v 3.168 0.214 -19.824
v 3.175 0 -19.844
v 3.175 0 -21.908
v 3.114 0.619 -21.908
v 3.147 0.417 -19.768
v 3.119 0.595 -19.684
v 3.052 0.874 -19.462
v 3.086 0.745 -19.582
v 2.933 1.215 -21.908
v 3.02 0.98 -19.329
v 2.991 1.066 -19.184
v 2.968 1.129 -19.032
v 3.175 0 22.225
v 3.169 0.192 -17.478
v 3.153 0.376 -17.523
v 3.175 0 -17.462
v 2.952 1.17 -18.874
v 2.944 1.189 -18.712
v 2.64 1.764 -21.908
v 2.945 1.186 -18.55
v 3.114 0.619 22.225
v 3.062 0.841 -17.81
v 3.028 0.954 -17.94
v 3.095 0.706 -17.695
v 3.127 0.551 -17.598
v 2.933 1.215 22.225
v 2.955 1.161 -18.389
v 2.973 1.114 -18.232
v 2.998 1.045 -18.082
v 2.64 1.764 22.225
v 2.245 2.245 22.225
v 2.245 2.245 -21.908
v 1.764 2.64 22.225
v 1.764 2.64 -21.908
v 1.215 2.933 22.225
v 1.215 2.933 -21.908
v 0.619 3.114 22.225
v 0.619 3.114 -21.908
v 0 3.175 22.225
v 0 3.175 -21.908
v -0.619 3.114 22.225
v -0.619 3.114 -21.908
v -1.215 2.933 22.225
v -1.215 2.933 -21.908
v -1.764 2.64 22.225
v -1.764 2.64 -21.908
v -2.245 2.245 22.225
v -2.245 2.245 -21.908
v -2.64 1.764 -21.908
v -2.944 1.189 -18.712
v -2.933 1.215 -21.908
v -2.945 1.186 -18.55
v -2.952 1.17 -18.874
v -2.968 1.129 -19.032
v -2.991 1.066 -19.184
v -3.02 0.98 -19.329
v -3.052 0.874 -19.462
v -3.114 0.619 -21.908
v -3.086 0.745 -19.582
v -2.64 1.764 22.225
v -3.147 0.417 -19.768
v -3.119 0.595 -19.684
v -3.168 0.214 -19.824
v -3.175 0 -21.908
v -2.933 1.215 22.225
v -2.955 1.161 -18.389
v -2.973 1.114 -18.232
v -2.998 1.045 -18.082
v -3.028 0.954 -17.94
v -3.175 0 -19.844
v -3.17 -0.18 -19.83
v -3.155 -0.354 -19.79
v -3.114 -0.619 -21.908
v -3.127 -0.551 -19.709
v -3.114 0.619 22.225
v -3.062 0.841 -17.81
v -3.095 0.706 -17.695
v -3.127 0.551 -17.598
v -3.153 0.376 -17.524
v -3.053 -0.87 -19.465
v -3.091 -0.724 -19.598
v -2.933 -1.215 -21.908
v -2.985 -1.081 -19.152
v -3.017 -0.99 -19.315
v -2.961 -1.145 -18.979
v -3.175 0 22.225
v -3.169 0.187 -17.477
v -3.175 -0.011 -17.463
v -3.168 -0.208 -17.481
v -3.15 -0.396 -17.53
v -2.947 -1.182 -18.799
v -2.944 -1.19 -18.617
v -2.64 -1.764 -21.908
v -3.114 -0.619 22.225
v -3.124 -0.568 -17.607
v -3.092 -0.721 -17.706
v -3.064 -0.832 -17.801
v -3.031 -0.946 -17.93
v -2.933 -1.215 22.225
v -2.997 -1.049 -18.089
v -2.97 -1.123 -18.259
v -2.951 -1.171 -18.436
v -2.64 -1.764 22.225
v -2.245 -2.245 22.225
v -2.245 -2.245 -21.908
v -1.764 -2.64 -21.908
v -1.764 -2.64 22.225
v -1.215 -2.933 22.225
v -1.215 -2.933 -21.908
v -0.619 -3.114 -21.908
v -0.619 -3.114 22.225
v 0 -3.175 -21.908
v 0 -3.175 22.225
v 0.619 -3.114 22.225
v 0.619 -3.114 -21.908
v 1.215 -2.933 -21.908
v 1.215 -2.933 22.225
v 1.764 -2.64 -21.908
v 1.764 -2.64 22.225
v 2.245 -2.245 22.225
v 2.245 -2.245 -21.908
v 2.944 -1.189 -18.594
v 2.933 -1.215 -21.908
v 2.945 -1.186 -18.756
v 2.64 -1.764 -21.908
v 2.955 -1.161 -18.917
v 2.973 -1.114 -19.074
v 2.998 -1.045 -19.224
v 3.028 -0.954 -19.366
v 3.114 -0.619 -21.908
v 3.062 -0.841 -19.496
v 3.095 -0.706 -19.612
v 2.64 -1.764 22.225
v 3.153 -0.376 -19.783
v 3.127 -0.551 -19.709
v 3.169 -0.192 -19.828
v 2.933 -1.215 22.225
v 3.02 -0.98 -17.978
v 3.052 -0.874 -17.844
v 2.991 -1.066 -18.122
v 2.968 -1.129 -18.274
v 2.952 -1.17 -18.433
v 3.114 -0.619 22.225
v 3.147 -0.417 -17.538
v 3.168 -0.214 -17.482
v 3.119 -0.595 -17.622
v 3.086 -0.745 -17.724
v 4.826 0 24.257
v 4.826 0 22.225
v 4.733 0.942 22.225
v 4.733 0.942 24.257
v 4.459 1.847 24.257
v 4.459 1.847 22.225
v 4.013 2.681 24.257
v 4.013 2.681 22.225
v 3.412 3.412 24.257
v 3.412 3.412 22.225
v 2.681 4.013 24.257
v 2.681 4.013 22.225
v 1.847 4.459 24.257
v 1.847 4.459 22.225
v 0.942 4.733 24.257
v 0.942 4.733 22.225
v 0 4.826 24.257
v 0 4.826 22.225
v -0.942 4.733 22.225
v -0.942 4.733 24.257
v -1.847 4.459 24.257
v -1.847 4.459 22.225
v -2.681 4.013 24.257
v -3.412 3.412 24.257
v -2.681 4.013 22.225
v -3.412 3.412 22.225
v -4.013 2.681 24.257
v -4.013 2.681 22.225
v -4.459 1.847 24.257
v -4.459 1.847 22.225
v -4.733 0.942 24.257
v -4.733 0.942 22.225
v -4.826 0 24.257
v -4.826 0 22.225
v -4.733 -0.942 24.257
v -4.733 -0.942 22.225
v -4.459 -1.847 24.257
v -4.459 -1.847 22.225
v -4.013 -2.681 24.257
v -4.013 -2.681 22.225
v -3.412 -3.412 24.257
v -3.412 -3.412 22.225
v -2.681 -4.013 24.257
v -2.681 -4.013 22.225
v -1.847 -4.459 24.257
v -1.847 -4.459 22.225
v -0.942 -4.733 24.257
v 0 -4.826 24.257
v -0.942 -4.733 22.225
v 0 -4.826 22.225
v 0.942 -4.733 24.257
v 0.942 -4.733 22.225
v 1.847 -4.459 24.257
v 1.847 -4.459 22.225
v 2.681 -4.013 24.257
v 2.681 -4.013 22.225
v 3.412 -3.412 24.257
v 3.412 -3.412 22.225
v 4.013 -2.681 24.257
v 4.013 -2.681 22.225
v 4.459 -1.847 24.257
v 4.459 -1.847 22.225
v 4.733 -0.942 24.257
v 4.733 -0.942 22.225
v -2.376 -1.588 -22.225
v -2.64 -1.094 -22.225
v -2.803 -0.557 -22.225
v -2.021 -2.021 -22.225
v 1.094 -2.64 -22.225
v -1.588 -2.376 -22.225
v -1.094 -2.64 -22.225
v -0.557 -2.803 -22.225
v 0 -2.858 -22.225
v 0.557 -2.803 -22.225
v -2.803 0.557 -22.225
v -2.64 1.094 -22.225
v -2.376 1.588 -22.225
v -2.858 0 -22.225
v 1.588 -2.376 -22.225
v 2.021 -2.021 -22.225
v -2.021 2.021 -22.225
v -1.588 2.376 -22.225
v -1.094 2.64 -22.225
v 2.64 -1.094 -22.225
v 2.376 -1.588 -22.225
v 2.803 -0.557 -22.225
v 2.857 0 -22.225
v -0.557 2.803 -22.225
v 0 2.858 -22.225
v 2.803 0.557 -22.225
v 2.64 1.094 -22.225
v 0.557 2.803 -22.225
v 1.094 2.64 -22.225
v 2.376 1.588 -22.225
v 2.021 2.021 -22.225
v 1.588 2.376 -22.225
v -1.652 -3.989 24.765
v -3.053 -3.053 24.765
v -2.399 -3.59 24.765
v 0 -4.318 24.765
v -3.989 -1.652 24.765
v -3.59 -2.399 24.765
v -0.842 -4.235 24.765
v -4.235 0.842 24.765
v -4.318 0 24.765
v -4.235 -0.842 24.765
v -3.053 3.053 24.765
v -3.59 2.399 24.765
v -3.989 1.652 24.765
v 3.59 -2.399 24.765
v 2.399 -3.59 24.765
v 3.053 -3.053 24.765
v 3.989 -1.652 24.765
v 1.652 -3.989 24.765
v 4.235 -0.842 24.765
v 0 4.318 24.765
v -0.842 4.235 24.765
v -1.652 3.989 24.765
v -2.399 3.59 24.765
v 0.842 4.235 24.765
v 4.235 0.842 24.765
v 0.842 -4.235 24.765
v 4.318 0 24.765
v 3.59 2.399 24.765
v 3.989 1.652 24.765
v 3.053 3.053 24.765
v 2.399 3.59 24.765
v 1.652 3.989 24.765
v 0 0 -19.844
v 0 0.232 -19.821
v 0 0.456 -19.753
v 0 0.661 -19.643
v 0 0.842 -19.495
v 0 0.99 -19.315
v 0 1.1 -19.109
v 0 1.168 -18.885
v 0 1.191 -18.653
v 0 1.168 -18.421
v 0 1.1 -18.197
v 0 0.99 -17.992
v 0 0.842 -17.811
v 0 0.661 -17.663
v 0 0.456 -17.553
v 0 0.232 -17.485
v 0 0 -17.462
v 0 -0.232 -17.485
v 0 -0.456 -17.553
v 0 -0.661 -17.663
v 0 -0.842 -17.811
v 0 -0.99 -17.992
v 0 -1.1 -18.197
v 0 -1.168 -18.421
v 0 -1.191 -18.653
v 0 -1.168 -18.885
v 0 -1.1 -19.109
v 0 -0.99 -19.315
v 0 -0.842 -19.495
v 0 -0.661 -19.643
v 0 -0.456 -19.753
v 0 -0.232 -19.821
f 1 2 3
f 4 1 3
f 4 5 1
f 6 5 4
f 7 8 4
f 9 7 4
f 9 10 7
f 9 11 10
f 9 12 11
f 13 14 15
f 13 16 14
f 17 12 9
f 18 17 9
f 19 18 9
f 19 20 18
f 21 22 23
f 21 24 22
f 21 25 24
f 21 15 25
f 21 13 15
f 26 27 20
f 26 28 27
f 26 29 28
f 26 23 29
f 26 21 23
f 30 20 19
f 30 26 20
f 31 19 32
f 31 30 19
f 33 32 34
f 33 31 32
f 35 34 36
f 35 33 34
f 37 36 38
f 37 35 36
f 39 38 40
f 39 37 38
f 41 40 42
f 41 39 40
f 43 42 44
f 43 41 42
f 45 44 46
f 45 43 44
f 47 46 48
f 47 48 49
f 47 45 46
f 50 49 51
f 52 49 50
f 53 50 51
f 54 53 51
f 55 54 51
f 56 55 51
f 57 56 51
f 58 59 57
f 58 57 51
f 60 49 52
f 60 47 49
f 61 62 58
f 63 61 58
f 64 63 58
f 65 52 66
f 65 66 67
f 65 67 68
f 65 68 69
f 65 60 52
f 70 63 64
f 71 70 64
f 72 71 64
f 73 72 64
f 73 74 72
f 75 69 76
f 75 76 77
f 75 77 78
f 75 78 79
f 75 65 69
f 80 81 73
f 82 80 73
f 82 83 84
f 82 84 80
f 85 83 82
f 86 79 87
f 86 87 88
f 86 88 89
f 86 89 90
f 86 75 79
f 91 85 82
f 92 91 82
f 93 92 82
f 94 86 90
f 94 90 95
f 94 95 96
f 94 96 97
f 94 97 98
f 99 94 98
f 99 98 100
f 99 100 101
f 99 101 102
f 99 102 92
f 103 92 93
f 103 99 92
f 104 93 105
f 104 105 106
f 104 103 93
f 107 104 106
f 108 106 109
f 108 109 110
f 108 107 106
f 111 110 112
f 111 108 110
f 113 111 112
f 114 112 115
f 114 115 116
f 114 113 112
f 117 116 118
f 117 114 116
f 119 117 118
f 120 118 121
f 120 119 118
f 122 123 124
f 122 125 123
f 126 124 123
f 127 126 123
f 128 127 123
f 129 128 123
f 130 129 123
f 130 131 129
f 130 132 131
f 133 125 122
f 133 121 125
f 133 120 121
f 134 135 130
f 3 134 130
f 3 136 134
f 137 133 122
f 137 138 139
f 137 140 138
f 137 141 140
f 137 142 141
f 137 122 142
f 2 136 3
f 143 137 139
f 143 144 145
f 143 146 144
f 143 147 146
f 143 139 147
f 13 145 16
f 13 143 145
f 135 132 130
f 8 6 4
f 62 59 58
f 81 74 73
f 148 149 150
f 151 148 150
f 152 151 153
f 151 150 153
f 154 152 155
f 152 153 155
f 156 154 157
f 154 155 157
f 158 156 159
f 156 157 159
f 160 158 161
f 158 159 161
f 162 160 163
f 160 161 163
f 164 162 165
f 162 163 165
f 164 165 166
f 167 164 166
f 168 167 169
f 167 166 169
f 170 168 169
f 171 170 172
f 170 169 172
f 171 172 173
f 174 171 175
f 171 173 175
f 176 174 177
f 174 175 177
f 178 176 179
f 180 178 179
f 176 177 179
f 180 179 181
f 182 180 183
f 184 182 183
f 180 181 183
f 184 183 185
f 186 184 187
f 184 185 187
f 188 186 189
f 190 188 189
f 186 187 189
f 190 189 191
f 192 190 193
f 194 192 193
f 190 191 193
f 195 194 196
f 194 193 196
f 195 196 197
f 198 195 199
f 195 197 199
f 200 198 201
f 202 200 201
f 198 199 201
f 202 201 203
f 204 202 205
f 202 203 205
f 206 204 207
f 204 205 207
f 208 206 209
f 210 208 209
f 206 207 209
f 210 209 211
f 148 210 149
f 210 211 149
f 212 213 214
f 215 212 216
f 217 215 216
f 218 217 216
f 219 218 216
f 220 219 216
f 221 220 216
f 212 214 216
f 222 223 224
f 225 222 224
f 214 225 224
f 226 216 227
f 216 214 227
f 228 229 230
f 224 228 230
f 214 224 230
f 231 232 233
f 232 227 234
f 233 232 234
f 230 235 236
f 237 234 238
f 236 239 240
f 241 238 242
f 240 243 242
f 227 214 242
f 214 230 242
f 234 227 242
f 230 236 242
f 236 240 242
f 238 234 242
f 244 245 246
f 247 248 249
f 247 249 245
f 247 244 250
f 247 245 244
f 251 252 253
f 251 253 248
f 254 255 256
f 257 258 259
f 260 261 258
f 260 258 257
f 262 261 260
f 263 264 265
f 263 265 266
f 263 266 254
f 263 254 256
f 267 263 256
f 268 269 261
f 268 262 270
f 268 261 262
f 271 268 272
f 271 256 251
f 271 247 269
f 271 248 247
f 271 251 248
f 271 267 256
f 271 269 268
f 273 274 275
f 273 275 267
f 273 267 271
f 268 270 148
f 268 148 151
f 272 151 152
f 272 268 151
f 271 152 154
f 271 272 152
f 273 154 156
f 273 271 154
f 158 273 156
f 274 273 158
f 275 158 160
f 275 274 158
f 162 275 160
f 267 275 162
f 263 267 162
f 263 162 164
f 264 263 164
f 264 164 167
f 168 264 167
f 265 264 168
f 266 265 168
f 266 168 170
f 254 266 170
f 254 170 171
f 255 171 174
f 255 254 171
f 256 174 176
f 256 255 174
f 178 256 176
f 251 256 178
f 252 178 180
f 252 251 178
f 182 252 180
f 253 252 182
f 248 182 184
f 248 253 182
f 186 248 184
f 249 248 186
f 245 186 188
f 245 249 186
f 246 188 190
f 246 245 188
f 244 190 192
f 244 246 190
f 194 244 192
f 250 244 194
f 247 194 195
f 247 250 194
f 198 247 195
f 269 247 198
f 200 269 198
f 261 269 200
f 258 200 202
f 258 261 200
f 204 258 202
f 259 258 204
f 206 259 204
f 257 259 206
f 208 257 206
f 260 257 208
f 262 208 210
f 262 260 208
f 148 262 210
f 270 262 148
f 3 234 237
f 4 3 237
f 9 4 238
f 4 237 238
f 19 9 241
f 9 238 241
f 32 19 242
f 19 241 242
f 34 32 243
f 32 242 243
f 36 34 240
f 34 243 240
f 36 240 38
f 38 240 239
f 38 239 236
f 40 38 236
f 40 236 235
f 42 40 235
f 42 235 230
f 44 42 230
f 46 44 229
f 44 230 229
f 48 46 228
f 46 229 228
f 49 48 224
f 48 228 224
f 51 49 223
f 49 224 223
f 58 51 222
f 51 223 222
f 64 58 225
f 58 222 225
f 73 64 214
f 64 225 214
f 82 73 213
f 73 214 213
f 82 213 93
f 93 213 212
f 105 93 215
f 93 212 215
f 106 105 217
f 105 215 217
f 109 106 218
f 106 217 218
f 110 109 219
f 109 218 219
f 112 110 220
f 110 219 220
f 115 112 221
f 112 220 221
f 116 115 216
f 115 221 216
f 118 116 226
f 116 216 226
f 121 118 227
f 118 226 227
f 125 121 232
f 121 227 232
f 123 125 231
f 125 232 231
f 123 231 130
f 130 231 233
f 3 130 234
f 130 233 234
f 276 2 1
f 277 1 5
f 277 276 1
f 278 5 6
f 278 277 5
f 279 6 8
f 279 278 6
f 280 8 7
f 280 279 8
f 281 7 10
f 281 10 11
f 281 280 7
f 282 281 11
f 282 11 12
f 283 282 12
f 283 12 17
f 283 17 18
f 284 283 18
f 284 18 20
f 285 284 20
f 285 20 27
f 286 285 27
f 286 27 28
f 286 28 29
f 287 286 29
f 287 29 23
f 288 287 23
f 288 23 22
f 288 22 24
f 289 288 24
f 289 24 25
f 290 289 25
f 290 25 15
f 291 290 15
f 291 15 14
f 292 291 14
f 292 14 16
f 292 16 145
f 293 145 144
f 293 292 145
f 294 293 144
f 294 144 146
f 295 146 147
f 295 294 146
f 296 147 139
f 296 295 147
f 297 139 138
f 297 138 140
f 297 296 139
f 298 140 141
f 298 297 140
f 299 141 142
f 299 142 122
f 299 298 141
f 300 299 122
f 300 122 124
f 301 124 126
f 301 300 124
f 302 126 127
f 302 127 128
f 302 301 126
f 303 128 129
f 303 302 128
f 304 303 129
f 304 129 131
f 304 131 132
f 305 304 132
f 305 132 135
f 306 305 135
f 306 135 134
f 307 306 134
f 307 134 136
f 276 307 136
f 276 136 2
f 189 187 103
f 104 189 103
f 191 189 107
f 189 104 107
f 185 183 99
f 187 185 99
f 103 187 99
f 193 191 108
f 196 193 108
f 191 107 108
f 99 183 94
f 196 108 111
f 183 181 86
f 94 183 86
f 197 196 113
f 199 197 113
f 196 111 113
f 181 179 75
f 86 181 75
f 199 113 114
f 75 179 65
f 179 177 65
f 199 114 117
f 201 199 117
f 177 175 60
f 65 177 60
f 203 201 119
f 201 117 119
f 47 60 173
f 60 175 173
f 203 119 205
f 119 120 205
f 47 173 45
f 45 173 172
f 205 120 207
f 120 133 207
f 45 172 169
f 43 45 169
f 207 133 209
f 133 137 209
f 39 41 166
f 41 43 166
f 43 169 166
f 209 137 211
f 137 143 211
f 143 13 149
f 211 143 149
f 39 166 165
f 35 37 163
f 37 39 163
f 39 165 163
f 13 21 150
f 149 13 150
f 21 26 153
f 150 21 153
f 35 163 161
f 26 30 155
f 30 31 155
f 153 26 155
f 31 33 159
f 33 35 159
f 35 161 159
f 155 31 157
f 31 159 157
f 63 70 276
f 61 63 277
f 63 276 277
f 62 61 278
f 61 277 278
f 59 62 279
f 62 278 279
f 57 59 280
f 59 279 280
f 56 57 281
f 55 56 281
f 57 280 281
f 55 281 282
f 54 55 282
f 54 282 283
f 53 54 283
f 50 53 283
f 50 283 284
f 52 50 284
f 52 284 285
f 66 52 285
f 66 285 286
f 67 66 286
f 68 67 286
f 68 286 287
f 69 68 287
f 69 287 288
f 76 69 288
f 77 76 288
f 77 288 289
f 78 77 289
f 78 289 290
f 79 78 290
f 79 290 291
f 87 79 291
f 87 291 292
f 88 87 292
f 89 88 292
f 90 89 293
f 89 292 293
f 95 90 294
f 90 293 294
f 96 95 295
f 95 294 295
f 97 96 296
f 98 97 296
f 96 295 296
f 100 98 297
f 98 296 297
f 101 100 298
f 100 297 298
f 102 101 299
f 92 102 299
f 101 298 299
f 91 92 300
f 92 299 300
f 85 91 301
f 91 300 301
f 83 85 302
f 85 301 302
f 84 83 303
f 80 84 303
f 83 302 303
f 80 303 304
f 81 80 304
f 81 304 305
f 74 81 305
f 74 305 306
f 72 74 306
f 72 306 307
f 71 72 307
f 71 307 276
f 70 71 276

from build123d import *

# Parameters (mm, degrees)
SKETCH1_R           = 3.175
EXTRUDE1_DEPTH      = 22.225
SKETCH2_R           = 4.826
EXTRUDE2_DEPTH      = 2.54
CHAMFER1_SIZE       = 0.508
SKETCH3_R           = 1.190625
EXTRUDE3_DEPTH      = 5.826
EXTRUDE3_DEPTH_BACK = 5.826
CHAMFER2_SIZE       = 0.3175


with BuildPart() as part:
    # Sketch1 → Extrude1 (new body, symmetric)
    with BuildSketch(Plane.XY):
        Circle(SKETCH1_R)
    extrude(amount=EXTRUDE1_DEPTH, both=True)

    # Sketch2 → Extrude2 (add)
    with BuildSketch(Plane.XY.offset(22.225)):
        Circle(SKETCH2_R)
    extrude(amount=EXTRUDE2_DEPTH)

    # Chamfer1
    chamfer1_edges = [part.edges().sort_by_distance(p)[0] for p in [
        (-4.826, 0, 24.765),
    ]]
    chamfer(chamfer1_edges, length=CHAMFER1_SIZE)

    # Sketch3 → Extrude3 (cut, two sides)
    with BuildSketch(Plane(origin=(0, 0, 0), x_dir=(0, 0, -1), z_dir=(1, 0, 0))) as extrude3_sk:
        with Locations((18.653125, 0)):
            Circle(SKETCH3_R)
    extrude(amount=EXTRUDE3_DEPTH, mode=Mode.SUBTRACT)
    extrude(extrude3_sk.sketch, amount=-EXTRUDE3_DEPTH_BACK, mode=Mode.SUBTRACT)

    # Chamfer2
    chamfer2_edges = [part.edges().sort_by_distance(p)[0] for p in [
        (-3.175, 0, -22.225),
    ]]
    chamfer(chamfer2_edges, length=CHAMFER2_SIZE)


solid = part.part
